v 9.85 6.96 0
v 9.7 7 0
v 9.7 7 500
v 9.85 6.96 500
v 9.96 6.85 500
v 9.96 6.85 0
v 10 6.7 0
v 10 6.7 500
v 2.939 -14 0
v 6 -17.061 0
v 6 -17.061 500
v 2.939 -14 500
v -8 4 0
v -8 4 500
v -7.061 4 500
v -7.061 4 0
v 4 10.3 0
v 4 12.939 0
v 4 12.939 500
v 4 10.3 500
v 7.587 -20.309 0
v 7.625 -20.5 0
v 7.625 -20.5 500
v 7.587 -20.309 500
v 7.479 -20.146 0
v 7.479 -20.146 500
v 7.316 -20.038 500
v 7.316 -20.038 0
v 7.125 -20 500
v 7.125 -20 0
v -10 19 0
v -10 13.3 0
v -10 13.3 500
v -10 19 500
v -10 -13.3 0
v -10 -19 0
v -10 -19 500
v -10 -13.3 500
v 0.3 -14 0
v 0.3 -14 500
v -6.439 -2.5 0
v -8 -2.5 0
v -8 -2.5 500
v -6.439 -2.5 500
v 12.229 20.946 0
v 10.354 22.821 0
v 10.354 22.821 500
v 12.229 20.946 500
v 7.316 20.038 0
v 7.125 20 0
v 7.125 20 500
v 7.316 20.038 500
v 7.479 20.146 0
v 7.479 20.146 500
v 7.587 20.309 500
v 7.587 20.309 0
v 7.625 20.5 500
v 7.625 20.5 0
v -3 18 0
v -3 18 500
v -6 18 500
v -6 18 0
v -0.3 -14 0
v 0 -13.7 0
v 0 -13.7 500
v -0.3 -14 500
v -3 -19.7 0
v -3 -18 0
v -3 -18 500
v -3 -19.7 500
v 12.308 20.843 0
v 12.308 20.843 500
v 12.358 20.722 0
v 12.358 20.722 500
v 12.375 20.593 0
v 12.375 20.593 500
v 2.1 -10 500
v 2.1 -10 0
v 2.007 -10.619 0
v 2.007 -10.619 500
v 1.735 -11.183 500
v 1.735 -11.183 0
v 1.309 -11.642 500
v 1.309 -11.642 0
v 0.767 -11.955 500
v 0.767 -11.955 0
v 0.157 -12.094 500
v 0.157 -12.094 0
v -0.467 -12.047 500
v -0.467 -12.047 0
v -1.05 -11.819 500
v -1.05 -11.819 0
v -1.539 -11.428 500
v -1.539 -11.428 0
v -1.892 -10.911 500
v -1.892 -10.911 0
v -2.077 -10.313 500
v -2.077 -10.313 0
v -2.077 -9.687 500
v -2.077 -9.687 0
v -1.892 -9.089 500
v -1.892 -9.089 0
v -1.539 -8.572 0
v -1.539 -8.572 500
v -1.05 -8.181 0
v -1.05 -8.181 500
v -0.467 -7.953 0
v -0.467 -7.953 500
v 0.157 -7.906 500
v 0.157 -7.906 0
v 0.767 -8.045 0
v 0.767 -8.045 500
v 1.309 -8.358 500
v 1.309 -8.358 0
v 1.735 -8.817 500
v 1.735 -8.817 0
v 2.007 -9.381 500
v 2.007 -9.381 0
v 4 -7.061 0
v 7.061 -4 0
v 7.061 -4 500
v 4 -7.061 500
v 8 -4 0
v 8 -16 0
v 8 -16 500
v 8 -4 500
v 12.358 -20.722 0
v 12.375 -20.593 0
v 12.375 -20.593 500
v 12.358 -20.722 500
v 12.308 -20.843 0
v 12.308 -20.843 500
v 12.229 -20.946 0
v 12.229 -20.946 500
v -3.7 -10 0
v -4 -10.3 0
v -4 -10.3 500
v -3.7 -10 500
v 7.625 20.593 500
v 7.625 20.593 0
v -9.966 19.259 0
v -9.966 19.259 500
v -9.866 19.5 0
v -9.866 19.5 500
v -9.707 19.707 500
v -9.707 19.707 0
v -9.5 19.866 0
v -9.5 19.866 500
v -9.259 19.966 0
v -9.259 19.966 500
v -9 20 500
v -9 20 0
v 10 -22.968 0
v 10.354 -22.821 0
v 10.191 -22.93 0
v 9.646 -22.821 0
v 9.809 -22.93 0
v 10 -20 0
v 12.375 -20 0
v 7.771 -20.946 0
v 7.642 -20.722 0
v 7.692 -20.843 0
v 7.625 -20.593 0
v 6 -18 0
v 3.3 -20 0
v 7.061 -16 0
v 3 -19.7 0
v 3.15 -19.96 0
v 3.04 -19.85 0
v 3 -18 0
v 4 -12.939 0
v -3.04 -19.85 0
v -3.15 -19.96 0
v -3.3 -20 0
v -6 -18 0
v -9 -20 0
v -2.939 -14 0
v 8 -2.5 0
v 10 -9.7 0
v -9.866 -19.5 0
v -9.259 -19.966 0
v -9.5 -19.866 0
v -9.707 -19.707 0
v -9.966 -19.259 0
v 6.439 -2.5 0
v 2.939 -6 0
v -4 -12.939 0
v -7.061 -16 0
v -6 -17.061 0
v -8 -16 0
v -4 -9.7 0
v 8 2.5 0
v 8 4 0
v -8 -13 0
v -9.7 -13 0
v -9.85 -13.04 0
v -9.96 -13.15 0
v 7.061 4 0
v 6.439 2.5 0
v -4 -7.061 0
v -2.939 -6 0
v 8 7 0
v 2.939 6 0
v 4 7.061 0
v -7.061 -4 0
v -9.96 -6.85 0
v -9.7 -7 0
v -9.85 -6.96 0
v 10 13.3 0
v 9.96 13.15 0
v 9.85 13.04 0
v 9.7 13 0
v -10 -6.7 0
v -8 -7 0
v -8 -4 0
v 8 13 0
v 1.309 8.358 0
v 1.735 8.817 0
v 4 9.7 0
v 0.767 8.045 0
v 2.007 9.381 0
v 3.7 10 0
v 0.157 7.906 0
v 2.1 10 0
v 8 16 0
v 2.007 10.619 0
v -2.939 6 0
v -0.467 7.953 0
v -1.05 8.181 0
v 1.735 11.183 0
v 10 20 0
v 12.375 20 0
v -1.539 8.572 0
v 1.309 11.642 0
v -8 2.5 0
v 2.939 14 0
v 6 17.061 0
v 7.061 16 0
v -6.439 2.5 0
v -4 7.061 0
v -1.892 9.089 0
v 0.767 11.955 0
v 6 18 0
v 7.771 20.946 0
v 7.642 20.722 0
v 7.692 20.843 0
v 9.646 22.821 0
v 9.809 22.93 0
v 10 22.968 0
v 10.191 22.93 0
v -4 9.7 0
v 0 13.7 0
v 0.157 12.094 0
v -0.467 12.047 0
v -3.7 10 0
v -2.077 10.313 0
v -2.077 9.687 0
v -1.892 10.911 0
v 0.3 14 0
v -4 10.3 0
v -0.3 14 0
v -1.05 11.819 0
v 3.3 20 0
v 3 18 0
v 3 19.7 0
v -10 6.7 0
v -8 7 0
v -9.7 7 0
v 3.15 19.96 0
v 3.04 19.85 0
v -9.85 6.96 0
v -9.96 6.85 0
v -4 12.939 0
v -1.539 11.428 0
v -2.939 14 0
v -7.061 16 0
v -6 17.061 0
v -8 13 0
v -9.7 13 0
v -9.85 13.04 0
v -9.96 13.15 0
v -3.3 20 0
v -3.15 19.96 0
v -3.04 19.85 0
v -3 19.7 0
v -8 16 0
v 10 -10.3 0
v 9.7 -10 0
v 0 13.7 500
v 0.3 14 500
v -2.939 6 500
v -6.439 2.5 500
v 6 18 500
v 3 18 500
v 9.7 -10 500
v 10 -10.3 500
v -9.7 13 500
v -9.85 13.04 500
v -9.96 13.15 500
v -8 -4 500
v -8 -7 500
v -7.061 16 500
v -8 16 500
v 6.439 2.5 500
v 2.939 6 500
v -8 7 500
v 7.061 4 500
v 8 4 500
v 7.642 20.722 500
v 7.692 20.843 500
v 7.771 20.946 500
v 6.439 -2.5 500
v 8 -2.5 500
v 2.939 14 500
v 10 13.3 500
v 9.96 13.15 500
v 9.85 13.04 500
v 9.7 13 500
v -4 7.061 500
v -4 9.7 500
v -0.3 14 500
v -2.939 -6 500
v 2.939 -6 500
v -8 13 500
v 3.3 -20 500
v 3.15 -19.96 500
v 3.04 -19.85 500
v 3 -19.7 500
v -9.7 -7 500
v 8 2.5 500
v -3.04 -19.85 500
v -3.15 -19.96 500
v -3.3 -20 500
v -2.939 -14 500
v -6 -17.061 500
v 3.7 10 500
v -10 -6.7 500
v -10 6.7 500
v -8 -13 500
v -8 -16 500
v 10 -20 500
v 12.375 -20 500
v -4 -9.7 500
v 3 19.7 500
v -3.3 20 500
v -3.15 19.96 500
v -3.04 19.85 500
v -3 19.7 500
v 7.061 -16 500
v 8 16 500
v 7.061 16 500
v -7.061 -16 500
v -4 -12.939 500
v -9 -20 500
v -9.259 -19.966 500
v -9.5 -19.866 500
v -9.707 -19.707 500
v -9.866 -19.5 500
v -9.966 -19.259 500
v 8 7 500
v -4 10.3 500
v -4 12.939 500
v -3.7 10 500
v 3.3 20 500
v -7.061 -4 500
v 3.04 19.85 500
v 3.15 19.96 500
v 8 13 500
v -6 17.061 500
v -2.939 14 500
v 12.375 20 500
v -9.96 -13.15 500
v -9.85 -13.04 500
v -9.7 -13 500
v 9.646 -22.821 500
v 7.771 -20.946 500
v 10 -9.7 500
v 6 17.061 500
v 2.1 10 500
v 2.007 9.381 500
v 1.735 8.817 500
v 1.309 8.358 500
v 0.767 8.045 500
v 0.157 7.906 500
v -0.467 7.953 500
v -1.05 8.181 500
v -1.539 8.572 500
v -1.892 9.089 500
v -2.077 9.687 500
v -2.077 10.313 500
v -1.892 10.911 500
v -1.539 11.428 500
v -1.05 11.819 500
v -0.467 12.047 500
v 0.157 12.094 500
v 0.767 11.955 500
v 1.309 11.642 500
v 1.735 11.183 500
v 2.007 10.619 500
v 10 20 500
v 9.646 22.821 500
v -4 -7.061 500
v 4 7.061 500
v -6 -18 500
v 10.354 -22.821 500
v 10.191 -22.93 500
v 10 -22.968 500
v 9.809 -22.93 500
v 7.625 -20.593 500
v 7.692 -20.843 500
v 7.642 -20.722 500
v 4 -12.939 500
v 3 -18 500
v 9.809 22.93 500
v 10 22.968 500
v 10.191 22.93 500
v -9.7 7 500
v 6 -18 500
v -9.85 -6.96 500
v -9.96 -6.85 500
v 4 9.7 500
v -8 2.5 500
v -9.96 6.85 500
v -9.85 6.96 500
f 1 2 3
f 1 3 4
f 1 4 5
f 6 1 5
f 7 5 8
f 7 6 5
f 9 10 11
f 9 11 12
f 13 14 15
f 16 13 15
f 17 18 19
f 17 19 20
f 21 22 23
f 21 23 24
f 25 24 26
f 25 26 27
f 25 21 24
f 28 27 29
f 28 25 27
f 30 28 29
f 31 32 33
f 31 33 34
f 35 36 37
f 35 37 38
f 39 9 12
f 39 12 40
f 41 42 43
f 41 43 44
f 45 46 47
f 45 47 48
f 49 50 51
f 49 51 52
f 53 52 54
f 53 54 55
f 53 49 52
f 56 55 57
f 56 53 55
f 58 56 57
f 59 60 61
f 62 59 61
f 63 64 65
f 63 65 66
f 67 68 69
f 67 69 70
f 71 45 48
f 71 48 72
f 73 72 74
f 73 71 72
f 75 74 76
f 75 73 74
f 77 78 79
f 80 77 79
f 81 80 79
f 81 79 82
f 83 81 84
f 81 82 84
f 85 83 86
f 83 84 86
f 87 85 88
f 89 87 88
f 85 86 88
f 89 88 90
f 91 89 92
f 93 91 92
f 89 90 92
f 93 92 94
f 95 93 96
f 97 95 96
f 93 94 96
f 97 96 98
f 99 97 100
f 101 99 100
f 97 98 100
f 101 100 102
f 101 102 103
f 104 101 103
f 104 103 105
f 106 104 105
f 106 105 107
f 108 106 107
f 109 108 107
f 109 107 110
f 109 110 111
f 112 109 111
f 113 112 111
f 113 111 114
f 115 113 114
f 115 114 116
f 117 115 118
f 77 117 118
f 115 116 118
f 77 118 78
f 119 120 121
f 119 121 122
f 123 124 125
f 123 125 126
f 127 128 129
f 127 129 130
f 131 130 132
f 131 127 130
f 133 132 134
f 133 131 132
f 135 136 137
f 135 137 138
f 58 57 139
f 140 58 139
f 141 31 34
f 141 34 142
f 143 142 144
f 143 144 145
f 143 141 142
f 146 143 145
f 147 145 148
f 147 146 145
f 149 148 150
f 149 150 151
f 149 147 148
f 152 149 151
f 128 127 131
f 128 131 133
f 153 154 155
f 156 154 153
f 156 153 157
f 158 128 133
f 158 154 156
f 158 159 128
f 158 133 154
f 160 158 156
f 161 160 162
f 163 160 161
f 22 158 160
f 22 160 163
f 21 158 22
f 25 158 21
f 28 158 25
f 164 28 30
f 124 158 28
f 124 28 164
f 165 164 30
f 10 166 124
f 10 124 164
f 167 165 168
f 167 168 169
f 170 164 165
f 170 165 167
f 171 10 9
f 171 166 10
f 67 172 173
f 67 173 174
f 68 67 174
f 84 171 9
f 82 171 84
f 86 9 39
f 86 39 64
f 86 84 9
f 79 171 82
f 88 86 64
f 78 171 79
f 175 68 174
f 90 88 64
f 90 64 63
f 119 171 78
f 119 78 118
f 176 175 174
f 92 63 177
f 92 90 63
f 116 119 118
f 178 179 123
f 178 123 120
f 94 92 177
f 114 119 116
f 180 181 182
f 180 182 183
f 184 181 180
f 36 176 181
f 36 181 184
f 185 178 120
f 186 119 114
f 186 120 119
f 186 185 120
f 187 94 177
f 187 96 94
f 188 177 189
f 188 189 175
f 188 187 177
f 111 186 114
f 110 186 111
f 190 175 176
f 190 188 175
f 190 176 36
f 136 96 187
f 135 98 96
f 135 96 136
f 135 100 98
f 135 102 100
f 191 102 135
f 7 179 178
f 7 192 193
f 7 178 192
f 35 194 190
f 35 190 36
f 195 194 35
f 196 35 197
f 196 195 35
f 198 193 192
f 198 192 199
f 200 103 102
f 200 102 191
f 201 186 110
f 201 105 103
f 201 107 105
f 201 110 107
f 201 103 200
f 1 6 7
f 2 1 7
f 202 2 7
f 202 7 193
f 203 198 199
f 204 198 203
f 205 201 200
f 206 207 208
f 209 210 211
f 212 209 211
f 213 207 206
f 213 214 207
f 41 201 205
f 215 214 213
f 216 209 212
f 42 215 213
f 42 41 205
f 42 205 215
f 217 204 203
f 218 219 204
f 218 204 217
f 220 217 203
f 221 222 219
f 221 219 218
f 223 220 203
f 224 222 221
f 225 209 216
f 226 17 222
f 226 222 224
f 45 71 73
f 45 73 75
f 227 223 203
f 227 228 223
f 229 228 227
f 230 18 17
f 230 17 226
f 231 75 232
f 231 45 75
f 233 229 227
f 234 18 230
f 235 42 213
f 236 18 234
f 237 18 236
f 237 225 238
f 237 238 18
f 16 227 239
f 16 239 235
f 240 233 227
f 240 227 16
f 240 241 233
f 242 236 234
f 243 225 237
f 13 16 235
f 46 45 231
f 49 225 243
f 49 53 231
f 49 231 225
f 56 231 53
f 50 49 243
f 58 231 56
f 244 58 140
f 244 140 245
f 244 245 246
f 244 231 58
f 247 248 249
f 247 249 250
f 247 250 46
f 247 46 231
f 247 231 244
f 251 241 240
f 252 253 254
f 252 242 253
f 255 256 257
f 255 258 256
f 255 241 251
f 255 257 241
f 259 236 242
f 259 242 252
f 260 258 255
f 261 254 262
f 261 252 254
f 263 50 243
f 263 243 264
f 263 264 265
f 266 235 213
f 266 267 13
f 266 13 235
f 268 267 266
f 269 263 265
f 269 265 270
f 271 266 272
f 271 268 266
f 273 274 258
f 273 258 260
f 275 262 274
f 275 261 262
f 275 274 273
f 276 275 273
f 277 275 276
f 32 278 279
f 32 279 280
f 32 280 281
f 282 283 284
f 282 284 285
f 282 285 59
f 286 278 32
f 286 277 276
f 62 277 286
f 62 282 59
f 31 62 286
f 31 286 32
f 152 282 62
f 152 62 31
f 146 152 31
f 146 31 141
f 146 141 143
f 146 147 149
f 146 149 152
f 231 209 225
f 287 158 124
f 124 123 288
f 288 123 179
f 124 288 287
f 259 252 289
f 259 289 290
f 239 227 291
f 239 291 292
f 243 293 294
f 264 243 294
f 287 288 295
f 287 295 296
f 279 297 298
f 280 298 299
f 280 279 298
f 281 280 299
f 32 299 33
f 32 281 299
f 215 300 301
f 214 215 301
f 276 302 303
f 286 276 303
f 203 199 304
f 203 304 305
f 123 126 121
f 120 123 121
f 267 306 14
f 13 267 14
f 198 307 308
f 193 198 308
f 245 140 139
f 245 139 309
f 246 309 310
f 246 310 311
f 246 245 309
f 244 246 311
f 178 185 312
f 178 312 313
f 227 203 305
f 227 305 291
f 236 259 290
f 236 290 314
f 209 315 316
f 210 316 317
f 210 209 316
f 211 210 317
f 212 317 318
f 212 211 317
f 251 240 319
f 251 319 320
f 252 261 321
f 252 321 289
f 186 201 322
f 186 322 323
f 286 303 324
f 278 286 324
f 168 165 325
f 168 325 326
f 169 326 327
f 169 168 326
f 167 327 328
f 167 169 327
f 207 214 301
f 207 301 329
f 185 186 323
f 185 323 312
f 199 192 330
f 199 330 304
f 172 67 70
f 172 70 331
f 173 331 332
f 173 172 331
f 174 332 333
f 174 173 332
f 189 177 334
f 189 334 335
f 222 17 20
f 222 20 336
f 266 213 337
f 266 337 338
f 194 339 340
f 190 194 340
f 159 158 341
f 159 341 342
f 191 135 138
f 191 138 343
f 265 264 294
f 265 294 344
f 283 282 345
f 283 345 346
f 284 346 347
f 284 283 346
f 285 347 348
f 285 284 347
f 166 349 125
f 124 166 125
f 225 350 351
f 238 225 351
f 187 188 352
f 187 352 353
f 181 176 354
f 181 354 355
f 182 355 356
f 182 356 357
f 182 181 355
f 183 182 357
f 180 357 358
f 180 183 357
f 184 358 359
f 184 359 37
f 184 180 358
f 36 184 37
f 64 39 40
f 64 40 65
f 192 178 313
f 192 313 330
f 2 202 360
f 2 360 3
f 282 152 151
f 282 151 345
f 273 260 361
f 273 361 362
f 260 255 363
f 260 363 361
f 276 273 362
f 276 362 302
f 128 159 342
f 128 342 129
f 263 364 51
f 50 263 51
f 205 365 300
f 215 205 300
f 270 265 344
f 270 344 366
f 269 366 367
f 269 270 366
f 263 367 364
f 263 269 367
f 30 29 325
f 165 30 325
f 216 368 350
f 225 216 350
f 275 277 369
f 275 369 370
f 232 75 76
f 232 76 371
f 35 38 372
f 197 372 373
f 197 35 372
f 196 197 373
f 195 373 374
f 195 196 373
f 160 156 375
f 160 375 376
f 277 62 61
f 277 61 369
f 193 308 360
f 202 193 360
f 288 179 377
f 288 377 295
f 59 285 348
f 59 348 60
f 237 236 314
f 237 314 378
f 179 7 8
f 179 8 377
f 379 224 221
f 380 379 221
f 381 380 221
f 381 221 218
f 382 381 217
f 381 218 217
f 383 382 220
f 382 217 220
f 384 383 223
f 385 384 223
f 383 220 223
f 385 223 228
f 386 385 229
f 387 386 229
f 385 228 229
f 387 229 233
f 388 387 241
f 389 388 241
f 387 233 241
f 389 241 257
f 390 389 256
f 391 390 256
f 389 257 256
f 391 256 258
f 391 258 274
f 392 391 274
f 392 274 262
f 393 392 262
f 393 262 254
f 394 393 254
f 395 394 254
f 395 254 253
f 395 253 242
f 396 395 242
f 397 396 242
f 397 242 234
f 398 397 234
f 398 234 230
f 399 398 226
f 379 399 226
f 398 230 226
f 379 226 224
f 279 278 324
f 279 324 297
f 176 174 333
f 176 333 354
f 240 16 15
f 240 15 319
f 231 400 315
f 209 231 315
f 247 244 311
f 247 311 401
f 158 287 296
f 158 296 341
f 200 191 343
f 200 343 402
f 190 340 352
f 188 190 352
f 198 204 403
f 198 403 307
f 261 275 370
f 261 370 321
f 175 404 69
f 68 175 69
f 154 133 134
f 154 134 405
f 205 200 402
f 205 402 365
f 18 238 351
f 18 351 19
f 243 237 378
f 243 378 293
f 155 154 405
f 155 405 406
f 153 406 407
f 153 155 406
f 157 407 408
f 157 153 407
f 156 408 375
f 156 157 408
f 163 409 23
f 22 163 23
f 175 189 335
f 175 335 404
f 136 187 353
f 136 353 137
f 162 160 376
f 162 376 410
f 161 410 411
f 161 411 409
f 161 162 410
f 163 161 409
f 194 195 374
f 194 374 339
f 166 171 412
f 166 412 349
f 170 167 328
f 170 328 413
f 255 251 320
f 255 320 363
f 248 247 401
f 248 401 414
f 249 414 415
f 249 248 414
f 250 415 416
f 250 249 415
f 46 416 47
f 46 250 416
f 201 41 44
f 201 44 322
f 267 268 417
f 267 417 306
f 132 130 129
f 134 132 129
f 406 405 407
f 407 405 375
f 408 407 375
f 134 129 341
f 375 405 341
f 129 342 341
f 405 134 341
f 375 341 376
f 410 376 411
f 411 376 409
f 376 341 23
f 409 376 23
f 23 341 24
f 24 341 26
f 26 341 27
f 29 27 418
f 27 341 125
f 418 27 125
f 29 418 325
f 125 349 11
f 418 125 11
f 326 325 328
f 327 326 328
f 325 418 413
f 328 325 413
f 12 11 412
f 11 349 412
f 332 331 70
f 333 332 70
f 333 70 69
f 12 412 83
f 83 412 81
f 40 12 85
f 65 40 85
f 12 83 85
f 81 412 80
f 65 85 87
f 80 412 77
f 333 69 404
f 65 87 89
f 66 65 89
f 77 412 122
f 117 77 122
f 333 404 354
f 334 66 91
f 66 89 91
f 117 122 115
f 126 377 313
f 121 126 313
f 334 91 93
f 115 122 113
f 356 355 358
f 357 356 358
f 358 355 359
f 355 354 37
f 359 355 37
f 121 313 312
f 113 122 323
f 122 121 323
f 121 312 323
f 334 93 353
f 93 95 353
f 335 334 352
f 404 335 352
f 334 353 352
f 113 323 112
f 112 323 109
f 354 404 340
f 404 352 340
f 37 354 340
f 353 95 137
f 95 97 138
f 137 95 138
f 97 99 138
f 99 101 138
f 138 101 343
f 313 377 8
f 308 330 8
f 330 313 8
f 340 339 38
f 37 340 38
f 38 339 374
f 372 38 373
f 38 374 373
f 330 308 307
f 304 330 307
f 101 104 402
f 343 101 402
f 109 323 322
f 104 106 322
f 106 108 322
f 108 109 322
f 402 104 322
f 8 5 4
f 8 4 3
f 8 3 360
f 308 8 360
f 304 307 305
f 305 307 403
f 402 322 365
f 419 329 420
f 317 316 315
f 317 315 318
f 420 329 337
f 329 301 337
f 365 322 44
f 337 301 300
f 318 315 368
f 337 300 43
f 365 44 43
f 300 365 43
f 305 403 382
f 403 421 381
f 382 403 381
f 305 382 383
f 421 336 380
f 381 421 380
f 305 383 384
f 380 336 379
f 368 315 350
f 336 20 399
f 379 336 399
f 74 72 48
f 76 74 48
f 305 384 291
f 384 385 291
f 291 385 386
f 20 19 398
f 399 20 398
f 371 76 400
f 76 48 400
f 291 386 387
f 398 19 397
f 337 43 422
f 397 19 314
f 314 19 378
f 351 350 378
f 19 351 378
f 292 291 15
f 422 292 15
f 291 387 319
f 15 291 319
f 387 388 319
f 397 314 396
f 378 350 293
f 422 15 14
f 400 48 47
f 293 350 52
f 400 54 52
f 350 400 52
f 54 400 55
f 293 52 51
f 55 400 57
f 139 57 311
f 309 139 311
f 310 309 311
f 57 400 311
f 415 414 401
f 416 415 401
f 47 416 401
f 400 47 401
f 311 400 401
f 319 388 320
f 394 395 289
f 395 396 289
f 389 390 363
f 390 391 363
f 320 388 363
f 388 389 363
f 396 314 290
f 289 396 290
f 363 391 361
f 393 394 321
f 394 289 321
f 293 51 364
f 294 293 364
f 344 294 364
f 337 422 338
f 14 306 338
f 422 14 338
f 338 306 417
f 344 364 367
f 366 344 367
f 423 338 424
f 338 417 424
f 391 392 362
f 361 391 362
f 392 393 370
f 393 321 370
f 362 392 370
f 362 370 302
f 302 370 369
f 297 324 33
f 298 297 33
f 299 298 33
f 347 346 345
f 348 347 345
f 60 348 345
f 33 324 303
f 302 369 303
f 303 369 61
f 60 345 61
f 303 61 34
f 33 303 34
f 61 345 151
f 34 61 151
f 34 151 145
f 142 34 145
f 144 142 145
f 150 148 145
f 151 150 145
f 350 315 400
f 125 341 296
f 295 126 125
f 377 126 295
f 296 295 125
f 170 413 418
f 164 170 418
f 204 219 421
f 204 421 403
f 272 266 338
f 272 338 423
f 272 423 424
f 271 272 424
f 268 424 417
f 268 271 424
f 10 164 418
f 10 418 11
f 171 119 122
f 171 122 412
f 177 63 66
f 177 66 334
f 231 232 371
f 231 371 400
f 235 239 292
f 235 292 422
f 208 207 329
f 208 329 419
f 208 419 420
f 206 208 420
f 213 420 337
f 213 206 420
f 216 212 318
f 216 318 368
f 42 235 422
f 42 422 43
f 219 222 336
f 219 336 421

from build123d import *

# Parameters (mm, degrees)
SKETCH1_R           = 2.1
BOSS_EXTRUDE1_DEPTH = 500


with BuildPart() as part:
    # Sketch1 → Boss-Extrude1 (new body)
    with BuildSketch(Plane(origin=(0, 0, 0), x_dir=(-1, 0, 0), z_dir=(0, 0, -1))):
        with BuildLine():
            Line((-9.646446609, -22.821446609), (-7.771446609, -20.946446609))
            ThreePointArc((-7.771446609, -20.946446609), (-7.663060234, -20.784234935), (-7.625, -20.592893219))
            Line((-7.625, -20.592893219), (-7.625, -20.5))
            ThreePointArc((-7.625, -20.5), (-7.478553391, -20.146446609), (-7.125, -20))
            Line((-7.125, -20), (-3.3, -20))
            ThreePointArc((-3.3, -20), (-3.087867966, -19.912132034), (-3, -19.7))
            Line((-3, -19.7), (-3, -18))
            Line((-3, -18), (-6, -18))
            Line((-6, -18), (-6, -17.060660172))
            Line((-6, -17.060660172), (-2.939339828, -14))
            Line((-2.939339828, -14), (-0.3, -14))
            Line((-0.3, -14), (0, -13.7))
            Line((0, -13.7), (0.3, -14))
            Line((0.3, -14), (2.939339828, -14))
            Line((2.939339828, -14), (6, -17.060660172))
            Line((6, -17.060660172), (6, -18))
            Line((6, -18), (3, -18))
            Line((3, -18), (3, -19.7))
            ThreePointArc((3, -19.7), (3.087867966, -19.912132034), (3.3, -20))
            Line((3.3, -20), (9, -20))
            ThreePointArc((9, -20), (9.707106781, -19.707106781), (10, -19))
            Line((10, -19), (10, -13.3))
            ThreePointArc((10, -13.3), (9.912132034, -13.087867966), (9.7, -13))
            Line((9.7, -13), (8, -13))
            Line((8, -13), (8, -16))
            Line((8, -16), (7.060660172, -16))
            Line((7.060660172, -16), (4, -12.939339828))
            Line((4, -12.939339828), (4, -10.3))
            Line((4, -10.3), (3.7, -10))
            Line((3.7, -10), (4, -9.7))
            Line((4, -9.7), (4, -7.060660172))
            Line((4, -7.060660172), (7.060660172, -4))
            Line((7.060660172, -4), (8, -4))
            Line((8, -4), (8, -7))
            Line((8, -7), (9.7, -7))
            ThreePointArc((9.7, -7), (9.912132034, -6.912132034), (10, -6.7))
            Line((10, -6.7), (10, 6.7))
            ThreePointArc((10, 6.7), (9.912132034, 6.912132034), (9.7, 7))
            Line((9.7, 7), (8, 7))
            Line((8, 7), (8, 4))
            Line((8, 4), (7.060660172, 4))
            Line((7.060660172, 4), (4, 7.060660172))
            Line((4, 7.060660172), (4, 9.7))
            Line((4, 9.7), (3.7, 10))
            Line((3.7, 10), (4, 10.3))
            Line((4, 10.3), (4, 12.939339828))
            Line((4, 12.939339828), (7.060660172, 16))
            Line((7.060660172, 16), (8, 16))
            Line((8, 16), (8, 13))
            Line((8, 13), (9.7, 13))
            ThreePointArc((9.7, 13), (9.912132034, 13.087867966), (10, 13.3))
            Line((10, 13.3), (10, 19))
            ThreePointArc((10, 19), (9.707106781, 19.707106781), (9, 20))
            Line((9, 20), (3.300000001, 20))
            ThreePointArc((3.300000001, 20), (3.087867966, 19.912132034), (3, 19.699999999))
            Line((3, 19.699999999), (3, 18))
            Line((3, 18), (6, 18))
            Line((6, 18), (6, 17.060660172))
            Line((6, 17.060660172), (2.939339828, 14))
            Line((2.939339828, 14), (0.3, 14))
            Line((0.3, 14), (0, 13.7))
            Line((0, 13.7), (-0.3, 14))
            Line((-0.3, 14), (-2.939339828, 14))
            Line((-2.939339828, 14), (-6, 17.060660172))
            Line((-6, 17.060660172), (-6, 18))
            Line((-6, 18), (-3, 18))
            Line((-3, 18), (-3, 19.7))
            ThreePointArc((-3, 19.7), (-3.087867966, 19.912132034), (-3.3, 20))
            Line((-3.3, 20), (-7.125, 20))
            ThreePointArc((-7.125, 20), (-7.478553391, 20.146446609), (-7.625, 20.5))
            Line((-7.625, 20.5), (-7.625, 20.592893219))
            ThreePointArc((-7.625, 20.592893219), (-7.663060234, 20.784234935), (-7.771446609, 20.946446609))
            Line((-7.771446609, 20.946446609), (-9.646446609, 22.821446609))
            ThreePointArc((-9.646446609, 22.821446609), (-10, 22.967893219), (-10.353553391, 22.821446609))
            Line((-10.353553391, 22.821446609), (-12.228553391, 20.946446609))
            ThreePointArc((-12.228553391, 20.946446609), (-12.336939766, 20.784234935), (-12.375, 20.592893219))
            Line((-12.375, 20.592893219), (-12.375, 20))
            Line((-12.375, 20), (-10, 20))
            Line((-10, 20), (-10, 13.3))
            ThreePointArc((-10, 13.3), (-9.912132034, 13.087867966), (-9.7, 13))
            Line((-9.7, 13), (-8, 13))
            Line((-8, 13), (-8, 16))
            Line((-8, 16), (-7.060660172, 16))
            Line((-7.060660172, 16), (-4, 12.939339828))
            Line((-4, 12.939339828), (-4, 10.3))
            Line((-4, 10.3), (-3.7, 10))
            Line((-3.7, 10), (-4, 9.7))
            Line((-4, 9.7), (-4, 7.060660172))
            Line((-4, 7.060660172), (-7.060660172, 4))
            Line((-7.060660172, 4), (-8, 4))
            Line((-8, 4), (-8, 7))
            Line((-8, 7), (-9.7, 7))
            ThreePointArc((-9.7, 7), (-9.912132034, 6.912132034), (-10, 6.7))
            Line((-10, 6.7), (-10, -9.7))
            Line((-10, -9.7), (-9.7, -10))
            Line((-9.7, -10), (-10, -10.3))
            Line((-10, -10.3), (-10, -20))
            Line((-10, -20), (-12.375, -20))
            Line((-12.375, -20), (-12.375, -20.592893219))
            ThreePointArc((-12.375, -20.592893219), (-12.336939766, -20.784234935), (-12.228553391, -20.946446609))
            Line((-12.228553391, -20.946446609), (-10.353553391, -22.821446609))
            ThreePointArc((-10.353553391, -22.821446609), (-10, -22.967893219), (-9.646446609, -22.821446609))
        make_face()
        with Locations(Location((0, 10, 0), (0, 0, 180))):
            Circle(SKETCH1_R, mode=Mode.SUBTRACT)
        with Locations(Location((0, -10, 0), (0, 0, 180))):
            Circle(SKETCH1_R, mode=Mode.SUBTRACT)
        Polygon((-8, -4), (-7.060660172, -4), (-4, -7.060660172), (-4, -12.939339828), (-7.060660172, -16), (-8, -16), align=None, mode=Mode.SUBTRACT)
        Polygon((8, -2.5), (6.439339828, -2.5), (2.939339828, -6), (-2.939339828, -6), (-6.439339828, -2.5), (-8, -2.5), (-8, 2.5), (-6.439339828, 2.5), (-2.939339828, 6), (2.939339828, 6), (6.439339828, 2.5), (8, 2.5), align=None, mode=Mode.SUBTRACT)
    extrude(amount=-BOSS_EXTRUDE1_DEPTH)


solid = part.part
